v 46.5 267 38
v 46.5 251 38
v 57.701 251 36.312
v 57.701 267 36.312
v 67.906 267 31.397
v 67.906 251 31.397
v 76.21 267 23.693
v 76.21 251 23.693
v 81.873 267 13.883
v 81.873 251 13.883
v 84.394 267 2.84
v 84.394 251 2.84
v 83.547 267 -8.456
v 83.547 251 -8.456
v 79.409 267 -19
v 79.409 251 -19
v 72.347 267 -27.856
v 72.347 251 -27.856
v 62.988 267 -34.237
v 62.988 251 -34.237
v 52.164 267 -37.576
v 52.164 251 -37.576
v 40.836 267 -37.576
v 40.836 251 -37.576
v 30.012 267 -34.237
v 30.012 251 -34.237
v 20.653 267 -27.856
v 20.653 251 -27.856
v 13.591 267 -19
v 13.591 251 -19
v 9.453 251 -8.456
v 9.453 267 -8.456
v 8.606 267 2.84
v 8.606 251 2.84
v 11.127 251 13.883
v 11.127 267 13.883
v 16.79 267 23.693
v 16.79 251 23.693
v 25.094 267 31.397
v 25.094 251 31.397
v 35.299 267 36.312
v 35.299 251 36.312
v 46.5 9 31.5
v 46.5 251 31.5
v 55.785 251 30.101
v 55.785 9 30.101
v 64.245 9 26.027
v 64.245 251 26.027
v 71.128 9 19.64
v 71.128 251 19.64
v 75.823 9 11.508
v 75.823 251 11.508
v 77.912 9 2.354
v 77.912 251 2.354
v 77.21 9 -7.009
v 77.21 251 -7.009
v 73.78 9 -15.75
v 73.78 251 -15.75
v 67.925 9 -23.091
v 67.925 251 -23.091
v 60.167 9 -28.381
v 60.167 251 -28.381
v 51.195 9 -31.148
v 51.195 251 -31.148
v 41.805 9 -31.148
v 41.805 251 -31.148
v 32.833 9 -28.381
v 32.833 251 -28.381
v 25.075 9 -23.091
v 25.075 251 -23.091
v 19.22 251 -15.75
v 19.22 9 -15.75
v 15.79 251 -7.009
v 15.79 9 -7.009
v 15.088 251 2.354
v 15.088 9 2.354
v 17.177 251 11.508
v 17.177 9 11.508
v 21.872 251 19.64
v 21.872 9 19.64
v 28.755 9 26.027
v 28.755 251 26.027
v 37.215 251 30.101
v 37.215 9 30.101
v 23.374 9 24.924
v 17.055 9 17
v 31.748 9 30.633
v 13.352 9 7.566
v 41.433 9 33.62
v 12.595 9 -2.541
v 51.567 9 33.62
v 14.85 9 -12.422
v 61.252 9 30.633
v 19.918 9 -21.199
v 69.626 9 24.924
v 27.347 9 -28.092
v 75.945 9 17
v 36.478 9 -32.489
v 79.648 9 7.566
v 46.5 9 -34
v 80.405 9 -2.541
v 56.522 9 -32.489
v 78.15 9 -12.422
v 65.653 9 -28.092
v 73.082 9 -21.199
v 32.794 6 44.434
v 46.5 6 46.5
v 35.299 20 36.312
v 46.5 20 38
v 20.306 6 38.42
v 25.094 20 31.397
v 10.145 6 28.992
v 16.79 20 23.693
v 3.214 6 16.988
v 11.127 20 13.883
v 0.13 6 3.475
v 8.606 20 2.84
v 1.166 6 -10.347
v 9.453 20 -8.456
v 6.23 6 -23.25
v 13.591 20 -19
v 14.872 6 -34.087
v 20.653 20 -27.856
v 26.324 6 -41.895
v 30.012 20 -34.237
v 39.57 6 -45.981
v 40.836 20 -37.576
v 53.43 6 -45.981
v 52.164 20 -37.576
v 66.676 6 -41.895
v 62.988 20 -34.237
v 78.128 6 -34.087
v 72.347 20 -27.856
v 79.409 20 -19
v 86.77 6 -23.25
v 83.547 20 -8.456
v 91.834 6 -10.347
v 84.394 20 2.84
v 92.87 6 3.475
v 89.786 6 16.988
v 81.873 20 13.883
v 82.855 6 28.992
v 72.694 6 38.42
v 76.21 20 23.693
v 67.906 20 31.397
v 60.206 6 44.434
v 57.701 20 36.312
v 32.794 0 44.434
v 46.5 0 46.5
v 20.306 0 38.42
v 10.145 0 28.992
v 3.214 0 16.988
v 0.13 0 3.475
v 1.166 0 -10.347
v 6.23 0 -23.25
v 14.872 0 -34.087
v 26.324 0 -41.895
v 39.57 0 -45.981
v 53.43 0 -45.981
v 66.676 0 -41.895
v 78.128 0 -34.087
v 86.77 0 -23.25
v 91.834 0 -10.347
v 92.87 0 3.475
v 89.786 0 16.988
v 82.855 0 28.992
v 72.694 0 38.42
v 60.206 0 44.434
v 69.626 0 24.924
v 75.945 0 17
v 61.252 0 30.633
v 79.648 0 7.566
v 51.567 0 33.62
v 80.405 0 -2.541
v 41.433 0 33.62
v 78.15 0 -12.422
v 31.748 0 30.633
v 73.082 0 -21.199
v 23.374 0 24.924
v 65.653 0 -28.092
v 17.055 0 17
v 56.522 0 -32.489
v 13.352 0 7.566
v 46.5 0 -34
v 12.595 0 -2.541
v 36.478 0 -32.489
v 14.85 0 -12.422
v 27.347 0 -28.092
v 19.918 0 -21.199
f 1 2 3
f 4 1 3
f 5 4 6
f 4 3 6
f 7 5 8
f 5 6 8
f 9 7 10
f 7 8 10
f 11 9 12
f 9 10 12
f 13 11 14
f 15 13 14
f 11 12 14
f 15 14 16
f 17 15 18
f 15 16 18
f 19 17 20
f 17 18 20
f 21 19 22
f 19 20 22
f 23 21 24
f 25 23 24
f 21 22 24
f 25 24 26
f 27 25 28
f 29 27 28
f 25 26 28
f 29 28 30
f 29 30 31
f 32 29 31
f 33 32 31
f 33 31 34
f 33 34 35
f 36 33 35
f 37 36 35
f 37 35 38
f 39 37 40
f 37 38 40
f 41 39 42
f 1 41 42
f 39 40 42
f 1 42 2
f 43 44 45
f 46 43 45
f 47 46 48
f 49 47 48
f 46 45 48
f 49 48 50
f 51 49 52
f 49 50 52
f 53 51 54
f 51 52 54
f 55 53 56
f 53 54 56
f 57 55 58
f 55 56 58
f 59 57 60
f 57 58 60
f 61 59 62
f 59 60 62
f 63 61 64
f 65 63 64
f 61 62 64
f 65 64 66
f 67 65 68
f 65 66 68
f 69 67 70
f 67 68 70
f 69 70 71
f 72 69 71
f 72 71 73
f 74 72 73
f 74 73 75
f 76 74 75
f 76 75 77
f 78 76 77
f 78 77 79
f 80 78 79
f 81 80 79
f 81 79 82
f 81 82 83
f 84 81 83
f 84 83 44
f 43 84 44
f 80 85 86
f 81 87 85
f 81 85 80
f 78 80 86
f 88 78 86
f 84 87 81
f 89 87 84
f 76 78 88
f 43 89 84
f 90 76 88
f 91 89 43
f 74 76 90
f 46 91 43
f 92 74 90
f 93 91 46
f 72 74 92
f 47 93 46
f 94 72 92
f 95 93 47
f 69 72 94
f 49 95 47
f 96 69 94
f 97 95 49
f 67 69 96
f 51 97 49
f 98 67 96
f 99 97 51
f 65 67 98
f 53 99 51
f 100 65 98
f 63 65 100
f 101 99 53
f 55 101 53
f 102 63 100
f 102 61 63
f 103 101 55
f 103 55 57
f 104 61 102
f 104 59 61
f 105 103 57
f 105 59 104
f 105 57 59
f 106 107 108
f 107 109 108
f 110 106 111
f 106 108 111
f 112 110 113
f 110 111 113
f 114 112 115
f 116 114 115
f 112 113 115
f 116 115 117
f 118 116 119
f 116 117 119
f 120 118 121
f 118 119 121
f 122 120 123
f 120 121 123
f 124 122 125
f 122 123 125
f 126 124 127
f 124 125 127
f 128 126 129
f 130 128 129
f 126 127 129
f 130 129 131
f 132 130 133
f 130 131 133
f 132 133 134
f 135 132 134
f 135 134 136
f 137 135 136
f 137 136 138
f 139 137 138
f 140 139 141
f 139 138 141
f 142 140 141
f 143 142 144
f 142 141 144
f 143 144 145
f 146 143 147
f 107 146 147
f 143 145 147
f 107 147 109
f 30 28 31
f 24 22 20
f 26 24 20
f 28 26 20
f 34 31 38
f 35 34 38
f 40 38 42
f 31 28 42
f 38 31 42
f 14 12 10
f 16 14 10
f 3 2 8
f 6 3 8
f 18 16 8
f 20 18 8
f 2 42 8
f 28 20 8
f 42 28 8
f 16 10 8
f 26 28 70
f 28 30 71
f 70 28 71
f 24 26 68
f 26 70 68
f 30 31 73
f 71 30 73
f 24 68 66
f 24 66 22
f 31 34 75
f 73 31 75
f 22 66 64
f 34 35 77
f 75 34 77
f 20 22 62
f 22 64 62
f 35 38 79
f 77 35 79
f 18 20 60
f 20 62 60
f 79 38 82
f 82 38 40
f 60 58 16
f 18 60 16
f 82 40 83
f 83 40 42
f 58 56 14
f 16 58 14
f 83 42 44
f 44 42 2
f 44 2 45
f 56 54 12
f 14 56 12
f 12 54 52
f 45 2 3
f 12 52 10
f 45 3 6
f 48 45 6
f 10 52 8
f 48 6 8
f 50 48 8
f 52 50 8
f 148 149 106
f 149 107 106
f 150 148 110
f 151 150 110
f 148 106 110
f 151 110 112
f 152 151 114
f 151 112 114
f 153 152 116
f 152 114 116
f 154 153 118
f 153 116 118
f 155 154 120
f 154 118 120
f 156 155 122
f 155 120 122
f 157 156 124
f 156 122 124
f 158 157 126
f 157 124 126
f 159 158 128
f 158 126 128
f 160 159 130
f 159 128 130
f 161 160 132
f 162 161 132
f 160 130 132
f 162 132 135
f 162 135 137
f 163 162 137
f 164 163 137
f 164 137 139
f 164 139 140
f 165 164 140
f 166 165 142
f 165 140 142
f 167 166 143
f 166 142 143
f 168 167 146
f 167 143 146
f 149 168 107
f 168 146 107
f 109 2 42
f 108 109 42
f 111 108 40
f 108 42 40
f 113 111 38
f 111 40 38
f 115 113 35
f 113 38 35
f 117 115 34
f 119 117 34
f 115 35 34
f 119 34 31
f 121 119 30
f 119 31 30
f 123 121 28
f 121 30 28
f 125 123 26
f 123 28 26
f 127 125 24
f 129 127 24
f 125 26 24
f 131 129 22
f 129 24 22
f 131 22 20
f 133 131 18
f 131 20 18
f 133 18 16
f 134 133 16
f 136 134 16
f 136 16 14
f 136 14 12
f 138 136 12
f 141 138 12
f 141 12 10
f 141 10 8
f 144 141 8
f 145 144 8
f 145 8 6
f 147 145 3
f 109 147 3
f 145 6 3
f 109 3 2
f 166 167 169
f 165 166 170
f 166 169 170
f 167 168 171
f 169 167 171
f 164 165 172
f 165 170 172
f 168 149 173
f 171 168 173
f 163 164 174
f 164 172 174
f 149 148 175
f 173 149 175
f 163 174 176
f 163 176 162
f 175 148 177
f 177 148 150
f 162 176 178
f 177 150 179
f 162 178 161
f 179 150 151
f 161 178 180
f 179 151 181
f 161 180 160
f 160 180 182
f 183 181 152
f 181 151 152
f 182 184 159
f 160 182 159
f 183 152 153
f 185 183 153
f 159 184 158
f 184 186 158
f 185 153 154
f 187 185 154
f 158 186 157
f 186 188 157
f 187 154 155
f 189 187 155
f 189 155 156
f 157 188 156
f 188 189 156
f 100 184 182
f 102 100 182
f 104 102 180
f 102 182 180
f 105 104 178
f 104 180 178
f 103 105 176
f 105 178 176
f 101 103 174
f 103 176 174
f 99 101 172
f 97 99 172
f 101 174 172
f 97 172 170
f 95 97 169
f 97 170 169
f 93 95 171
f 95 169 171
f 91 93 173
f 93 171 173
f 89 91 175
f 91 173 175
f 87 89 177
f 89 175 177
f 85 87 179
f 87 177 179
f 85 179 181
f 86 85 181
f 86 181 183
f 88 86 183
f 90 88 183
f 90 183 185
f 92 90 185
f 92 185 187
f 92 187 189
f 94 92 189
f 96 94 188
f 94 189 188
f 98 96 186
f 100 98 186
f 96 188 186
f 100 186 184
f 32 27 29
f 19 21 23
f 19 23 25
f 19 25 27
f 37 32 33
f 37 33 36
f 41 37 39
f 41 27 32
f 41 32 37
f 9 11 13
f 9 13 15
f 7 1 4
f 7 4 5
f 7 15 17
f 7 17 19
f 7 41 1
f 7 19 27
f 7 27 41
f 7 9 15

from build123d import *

# Parameters (mm, degrees)
SKETCH_2_R          = 31.5
CUT_EXTRUDE_1_DEPTH = 288.463475941
SKETCH_3_R          = 34
CUT_EXTRUDE_2_DEPTH = 9
SKETCH_4_W          = 90.880259592
SKETCH_4_H          = 24.111111111
CUT_EXTRUDE_3_DEPTH = 50
SKETCH_5_R          = 38
EXTRUDE_1_DEPTH     = 16


with BuildPart() as part:
    # 草圖1 → 旋轉1 (revolve)
    with BuildSketch(Plane.XY, mode=Mode.PRIVATE) as revolve_1_sk:
        Polygon((0, 0), (0, 6), (8.5, 20), (8.5, 268), (46.5, 268), (46.5, 0), align=None)
    revolve(revolve_1_sk.sketch.rotate(Axis((46.5, 292.214178218, 0), (0, -1, 0)), 270), axis=Axis((46.5, 292.214178218, 0), (0, -1, 0)))

    # 草圖2 → 除料-伸長1 (cut, through all)
    with BuildSketch(Plane(origin=(0, 268, 0), x_dir=(1, 0, 0), z_dir=(0, 1, 0))):
        with Locations(Location((46.5, 0, 0), (0, 0, 270))):
            Circle(SKETCH_2_R)
    extrude(amount=-CUT_EXTRUDE_1_DEPTH, mode=Mode.SUBTRACT)

    # 草圖3 → 除料-伸長2 (cut)
    with BuildSketch(Plane.XZ):
        with Locations(Location((46.5, 0, 0), (0, 0, 270))):
            Circle(SKETCH_3_R)
    extrude(amount=-CUT_EXTRUDE_2_DEPTH, mode=Mode.SUBTRACT)

    # 草圖4 → 除料-伸長3 (cut, symmetric)
    with BuildSketch(Plane.XY):
        with Locations((45.440129796, 263.055555556)):
            Rectangle(SKETCH_4_W, SKETCH_4_H)
    extrude(amount=CUT_EXTRUDE_3_DEPTH, both=True, mode=Mode.SUBTRACT)


with BuildPart() as body_2:
    # 草圖5 → 填料-伸長1 (new body)
    with BuildSketch(Plane(origin=(0, 251, 0), x_dir=(1, 0, 0), z_dir=(0, 1, 0))):
        with Locations(Location((46.5, 0, 0), (0, 0, 270))):
            Circle(SKETCH_5_R)
    extrude(amount=EXTRUDE_1_DEPTH)


solid = Compound([part.part, body_2.part])
